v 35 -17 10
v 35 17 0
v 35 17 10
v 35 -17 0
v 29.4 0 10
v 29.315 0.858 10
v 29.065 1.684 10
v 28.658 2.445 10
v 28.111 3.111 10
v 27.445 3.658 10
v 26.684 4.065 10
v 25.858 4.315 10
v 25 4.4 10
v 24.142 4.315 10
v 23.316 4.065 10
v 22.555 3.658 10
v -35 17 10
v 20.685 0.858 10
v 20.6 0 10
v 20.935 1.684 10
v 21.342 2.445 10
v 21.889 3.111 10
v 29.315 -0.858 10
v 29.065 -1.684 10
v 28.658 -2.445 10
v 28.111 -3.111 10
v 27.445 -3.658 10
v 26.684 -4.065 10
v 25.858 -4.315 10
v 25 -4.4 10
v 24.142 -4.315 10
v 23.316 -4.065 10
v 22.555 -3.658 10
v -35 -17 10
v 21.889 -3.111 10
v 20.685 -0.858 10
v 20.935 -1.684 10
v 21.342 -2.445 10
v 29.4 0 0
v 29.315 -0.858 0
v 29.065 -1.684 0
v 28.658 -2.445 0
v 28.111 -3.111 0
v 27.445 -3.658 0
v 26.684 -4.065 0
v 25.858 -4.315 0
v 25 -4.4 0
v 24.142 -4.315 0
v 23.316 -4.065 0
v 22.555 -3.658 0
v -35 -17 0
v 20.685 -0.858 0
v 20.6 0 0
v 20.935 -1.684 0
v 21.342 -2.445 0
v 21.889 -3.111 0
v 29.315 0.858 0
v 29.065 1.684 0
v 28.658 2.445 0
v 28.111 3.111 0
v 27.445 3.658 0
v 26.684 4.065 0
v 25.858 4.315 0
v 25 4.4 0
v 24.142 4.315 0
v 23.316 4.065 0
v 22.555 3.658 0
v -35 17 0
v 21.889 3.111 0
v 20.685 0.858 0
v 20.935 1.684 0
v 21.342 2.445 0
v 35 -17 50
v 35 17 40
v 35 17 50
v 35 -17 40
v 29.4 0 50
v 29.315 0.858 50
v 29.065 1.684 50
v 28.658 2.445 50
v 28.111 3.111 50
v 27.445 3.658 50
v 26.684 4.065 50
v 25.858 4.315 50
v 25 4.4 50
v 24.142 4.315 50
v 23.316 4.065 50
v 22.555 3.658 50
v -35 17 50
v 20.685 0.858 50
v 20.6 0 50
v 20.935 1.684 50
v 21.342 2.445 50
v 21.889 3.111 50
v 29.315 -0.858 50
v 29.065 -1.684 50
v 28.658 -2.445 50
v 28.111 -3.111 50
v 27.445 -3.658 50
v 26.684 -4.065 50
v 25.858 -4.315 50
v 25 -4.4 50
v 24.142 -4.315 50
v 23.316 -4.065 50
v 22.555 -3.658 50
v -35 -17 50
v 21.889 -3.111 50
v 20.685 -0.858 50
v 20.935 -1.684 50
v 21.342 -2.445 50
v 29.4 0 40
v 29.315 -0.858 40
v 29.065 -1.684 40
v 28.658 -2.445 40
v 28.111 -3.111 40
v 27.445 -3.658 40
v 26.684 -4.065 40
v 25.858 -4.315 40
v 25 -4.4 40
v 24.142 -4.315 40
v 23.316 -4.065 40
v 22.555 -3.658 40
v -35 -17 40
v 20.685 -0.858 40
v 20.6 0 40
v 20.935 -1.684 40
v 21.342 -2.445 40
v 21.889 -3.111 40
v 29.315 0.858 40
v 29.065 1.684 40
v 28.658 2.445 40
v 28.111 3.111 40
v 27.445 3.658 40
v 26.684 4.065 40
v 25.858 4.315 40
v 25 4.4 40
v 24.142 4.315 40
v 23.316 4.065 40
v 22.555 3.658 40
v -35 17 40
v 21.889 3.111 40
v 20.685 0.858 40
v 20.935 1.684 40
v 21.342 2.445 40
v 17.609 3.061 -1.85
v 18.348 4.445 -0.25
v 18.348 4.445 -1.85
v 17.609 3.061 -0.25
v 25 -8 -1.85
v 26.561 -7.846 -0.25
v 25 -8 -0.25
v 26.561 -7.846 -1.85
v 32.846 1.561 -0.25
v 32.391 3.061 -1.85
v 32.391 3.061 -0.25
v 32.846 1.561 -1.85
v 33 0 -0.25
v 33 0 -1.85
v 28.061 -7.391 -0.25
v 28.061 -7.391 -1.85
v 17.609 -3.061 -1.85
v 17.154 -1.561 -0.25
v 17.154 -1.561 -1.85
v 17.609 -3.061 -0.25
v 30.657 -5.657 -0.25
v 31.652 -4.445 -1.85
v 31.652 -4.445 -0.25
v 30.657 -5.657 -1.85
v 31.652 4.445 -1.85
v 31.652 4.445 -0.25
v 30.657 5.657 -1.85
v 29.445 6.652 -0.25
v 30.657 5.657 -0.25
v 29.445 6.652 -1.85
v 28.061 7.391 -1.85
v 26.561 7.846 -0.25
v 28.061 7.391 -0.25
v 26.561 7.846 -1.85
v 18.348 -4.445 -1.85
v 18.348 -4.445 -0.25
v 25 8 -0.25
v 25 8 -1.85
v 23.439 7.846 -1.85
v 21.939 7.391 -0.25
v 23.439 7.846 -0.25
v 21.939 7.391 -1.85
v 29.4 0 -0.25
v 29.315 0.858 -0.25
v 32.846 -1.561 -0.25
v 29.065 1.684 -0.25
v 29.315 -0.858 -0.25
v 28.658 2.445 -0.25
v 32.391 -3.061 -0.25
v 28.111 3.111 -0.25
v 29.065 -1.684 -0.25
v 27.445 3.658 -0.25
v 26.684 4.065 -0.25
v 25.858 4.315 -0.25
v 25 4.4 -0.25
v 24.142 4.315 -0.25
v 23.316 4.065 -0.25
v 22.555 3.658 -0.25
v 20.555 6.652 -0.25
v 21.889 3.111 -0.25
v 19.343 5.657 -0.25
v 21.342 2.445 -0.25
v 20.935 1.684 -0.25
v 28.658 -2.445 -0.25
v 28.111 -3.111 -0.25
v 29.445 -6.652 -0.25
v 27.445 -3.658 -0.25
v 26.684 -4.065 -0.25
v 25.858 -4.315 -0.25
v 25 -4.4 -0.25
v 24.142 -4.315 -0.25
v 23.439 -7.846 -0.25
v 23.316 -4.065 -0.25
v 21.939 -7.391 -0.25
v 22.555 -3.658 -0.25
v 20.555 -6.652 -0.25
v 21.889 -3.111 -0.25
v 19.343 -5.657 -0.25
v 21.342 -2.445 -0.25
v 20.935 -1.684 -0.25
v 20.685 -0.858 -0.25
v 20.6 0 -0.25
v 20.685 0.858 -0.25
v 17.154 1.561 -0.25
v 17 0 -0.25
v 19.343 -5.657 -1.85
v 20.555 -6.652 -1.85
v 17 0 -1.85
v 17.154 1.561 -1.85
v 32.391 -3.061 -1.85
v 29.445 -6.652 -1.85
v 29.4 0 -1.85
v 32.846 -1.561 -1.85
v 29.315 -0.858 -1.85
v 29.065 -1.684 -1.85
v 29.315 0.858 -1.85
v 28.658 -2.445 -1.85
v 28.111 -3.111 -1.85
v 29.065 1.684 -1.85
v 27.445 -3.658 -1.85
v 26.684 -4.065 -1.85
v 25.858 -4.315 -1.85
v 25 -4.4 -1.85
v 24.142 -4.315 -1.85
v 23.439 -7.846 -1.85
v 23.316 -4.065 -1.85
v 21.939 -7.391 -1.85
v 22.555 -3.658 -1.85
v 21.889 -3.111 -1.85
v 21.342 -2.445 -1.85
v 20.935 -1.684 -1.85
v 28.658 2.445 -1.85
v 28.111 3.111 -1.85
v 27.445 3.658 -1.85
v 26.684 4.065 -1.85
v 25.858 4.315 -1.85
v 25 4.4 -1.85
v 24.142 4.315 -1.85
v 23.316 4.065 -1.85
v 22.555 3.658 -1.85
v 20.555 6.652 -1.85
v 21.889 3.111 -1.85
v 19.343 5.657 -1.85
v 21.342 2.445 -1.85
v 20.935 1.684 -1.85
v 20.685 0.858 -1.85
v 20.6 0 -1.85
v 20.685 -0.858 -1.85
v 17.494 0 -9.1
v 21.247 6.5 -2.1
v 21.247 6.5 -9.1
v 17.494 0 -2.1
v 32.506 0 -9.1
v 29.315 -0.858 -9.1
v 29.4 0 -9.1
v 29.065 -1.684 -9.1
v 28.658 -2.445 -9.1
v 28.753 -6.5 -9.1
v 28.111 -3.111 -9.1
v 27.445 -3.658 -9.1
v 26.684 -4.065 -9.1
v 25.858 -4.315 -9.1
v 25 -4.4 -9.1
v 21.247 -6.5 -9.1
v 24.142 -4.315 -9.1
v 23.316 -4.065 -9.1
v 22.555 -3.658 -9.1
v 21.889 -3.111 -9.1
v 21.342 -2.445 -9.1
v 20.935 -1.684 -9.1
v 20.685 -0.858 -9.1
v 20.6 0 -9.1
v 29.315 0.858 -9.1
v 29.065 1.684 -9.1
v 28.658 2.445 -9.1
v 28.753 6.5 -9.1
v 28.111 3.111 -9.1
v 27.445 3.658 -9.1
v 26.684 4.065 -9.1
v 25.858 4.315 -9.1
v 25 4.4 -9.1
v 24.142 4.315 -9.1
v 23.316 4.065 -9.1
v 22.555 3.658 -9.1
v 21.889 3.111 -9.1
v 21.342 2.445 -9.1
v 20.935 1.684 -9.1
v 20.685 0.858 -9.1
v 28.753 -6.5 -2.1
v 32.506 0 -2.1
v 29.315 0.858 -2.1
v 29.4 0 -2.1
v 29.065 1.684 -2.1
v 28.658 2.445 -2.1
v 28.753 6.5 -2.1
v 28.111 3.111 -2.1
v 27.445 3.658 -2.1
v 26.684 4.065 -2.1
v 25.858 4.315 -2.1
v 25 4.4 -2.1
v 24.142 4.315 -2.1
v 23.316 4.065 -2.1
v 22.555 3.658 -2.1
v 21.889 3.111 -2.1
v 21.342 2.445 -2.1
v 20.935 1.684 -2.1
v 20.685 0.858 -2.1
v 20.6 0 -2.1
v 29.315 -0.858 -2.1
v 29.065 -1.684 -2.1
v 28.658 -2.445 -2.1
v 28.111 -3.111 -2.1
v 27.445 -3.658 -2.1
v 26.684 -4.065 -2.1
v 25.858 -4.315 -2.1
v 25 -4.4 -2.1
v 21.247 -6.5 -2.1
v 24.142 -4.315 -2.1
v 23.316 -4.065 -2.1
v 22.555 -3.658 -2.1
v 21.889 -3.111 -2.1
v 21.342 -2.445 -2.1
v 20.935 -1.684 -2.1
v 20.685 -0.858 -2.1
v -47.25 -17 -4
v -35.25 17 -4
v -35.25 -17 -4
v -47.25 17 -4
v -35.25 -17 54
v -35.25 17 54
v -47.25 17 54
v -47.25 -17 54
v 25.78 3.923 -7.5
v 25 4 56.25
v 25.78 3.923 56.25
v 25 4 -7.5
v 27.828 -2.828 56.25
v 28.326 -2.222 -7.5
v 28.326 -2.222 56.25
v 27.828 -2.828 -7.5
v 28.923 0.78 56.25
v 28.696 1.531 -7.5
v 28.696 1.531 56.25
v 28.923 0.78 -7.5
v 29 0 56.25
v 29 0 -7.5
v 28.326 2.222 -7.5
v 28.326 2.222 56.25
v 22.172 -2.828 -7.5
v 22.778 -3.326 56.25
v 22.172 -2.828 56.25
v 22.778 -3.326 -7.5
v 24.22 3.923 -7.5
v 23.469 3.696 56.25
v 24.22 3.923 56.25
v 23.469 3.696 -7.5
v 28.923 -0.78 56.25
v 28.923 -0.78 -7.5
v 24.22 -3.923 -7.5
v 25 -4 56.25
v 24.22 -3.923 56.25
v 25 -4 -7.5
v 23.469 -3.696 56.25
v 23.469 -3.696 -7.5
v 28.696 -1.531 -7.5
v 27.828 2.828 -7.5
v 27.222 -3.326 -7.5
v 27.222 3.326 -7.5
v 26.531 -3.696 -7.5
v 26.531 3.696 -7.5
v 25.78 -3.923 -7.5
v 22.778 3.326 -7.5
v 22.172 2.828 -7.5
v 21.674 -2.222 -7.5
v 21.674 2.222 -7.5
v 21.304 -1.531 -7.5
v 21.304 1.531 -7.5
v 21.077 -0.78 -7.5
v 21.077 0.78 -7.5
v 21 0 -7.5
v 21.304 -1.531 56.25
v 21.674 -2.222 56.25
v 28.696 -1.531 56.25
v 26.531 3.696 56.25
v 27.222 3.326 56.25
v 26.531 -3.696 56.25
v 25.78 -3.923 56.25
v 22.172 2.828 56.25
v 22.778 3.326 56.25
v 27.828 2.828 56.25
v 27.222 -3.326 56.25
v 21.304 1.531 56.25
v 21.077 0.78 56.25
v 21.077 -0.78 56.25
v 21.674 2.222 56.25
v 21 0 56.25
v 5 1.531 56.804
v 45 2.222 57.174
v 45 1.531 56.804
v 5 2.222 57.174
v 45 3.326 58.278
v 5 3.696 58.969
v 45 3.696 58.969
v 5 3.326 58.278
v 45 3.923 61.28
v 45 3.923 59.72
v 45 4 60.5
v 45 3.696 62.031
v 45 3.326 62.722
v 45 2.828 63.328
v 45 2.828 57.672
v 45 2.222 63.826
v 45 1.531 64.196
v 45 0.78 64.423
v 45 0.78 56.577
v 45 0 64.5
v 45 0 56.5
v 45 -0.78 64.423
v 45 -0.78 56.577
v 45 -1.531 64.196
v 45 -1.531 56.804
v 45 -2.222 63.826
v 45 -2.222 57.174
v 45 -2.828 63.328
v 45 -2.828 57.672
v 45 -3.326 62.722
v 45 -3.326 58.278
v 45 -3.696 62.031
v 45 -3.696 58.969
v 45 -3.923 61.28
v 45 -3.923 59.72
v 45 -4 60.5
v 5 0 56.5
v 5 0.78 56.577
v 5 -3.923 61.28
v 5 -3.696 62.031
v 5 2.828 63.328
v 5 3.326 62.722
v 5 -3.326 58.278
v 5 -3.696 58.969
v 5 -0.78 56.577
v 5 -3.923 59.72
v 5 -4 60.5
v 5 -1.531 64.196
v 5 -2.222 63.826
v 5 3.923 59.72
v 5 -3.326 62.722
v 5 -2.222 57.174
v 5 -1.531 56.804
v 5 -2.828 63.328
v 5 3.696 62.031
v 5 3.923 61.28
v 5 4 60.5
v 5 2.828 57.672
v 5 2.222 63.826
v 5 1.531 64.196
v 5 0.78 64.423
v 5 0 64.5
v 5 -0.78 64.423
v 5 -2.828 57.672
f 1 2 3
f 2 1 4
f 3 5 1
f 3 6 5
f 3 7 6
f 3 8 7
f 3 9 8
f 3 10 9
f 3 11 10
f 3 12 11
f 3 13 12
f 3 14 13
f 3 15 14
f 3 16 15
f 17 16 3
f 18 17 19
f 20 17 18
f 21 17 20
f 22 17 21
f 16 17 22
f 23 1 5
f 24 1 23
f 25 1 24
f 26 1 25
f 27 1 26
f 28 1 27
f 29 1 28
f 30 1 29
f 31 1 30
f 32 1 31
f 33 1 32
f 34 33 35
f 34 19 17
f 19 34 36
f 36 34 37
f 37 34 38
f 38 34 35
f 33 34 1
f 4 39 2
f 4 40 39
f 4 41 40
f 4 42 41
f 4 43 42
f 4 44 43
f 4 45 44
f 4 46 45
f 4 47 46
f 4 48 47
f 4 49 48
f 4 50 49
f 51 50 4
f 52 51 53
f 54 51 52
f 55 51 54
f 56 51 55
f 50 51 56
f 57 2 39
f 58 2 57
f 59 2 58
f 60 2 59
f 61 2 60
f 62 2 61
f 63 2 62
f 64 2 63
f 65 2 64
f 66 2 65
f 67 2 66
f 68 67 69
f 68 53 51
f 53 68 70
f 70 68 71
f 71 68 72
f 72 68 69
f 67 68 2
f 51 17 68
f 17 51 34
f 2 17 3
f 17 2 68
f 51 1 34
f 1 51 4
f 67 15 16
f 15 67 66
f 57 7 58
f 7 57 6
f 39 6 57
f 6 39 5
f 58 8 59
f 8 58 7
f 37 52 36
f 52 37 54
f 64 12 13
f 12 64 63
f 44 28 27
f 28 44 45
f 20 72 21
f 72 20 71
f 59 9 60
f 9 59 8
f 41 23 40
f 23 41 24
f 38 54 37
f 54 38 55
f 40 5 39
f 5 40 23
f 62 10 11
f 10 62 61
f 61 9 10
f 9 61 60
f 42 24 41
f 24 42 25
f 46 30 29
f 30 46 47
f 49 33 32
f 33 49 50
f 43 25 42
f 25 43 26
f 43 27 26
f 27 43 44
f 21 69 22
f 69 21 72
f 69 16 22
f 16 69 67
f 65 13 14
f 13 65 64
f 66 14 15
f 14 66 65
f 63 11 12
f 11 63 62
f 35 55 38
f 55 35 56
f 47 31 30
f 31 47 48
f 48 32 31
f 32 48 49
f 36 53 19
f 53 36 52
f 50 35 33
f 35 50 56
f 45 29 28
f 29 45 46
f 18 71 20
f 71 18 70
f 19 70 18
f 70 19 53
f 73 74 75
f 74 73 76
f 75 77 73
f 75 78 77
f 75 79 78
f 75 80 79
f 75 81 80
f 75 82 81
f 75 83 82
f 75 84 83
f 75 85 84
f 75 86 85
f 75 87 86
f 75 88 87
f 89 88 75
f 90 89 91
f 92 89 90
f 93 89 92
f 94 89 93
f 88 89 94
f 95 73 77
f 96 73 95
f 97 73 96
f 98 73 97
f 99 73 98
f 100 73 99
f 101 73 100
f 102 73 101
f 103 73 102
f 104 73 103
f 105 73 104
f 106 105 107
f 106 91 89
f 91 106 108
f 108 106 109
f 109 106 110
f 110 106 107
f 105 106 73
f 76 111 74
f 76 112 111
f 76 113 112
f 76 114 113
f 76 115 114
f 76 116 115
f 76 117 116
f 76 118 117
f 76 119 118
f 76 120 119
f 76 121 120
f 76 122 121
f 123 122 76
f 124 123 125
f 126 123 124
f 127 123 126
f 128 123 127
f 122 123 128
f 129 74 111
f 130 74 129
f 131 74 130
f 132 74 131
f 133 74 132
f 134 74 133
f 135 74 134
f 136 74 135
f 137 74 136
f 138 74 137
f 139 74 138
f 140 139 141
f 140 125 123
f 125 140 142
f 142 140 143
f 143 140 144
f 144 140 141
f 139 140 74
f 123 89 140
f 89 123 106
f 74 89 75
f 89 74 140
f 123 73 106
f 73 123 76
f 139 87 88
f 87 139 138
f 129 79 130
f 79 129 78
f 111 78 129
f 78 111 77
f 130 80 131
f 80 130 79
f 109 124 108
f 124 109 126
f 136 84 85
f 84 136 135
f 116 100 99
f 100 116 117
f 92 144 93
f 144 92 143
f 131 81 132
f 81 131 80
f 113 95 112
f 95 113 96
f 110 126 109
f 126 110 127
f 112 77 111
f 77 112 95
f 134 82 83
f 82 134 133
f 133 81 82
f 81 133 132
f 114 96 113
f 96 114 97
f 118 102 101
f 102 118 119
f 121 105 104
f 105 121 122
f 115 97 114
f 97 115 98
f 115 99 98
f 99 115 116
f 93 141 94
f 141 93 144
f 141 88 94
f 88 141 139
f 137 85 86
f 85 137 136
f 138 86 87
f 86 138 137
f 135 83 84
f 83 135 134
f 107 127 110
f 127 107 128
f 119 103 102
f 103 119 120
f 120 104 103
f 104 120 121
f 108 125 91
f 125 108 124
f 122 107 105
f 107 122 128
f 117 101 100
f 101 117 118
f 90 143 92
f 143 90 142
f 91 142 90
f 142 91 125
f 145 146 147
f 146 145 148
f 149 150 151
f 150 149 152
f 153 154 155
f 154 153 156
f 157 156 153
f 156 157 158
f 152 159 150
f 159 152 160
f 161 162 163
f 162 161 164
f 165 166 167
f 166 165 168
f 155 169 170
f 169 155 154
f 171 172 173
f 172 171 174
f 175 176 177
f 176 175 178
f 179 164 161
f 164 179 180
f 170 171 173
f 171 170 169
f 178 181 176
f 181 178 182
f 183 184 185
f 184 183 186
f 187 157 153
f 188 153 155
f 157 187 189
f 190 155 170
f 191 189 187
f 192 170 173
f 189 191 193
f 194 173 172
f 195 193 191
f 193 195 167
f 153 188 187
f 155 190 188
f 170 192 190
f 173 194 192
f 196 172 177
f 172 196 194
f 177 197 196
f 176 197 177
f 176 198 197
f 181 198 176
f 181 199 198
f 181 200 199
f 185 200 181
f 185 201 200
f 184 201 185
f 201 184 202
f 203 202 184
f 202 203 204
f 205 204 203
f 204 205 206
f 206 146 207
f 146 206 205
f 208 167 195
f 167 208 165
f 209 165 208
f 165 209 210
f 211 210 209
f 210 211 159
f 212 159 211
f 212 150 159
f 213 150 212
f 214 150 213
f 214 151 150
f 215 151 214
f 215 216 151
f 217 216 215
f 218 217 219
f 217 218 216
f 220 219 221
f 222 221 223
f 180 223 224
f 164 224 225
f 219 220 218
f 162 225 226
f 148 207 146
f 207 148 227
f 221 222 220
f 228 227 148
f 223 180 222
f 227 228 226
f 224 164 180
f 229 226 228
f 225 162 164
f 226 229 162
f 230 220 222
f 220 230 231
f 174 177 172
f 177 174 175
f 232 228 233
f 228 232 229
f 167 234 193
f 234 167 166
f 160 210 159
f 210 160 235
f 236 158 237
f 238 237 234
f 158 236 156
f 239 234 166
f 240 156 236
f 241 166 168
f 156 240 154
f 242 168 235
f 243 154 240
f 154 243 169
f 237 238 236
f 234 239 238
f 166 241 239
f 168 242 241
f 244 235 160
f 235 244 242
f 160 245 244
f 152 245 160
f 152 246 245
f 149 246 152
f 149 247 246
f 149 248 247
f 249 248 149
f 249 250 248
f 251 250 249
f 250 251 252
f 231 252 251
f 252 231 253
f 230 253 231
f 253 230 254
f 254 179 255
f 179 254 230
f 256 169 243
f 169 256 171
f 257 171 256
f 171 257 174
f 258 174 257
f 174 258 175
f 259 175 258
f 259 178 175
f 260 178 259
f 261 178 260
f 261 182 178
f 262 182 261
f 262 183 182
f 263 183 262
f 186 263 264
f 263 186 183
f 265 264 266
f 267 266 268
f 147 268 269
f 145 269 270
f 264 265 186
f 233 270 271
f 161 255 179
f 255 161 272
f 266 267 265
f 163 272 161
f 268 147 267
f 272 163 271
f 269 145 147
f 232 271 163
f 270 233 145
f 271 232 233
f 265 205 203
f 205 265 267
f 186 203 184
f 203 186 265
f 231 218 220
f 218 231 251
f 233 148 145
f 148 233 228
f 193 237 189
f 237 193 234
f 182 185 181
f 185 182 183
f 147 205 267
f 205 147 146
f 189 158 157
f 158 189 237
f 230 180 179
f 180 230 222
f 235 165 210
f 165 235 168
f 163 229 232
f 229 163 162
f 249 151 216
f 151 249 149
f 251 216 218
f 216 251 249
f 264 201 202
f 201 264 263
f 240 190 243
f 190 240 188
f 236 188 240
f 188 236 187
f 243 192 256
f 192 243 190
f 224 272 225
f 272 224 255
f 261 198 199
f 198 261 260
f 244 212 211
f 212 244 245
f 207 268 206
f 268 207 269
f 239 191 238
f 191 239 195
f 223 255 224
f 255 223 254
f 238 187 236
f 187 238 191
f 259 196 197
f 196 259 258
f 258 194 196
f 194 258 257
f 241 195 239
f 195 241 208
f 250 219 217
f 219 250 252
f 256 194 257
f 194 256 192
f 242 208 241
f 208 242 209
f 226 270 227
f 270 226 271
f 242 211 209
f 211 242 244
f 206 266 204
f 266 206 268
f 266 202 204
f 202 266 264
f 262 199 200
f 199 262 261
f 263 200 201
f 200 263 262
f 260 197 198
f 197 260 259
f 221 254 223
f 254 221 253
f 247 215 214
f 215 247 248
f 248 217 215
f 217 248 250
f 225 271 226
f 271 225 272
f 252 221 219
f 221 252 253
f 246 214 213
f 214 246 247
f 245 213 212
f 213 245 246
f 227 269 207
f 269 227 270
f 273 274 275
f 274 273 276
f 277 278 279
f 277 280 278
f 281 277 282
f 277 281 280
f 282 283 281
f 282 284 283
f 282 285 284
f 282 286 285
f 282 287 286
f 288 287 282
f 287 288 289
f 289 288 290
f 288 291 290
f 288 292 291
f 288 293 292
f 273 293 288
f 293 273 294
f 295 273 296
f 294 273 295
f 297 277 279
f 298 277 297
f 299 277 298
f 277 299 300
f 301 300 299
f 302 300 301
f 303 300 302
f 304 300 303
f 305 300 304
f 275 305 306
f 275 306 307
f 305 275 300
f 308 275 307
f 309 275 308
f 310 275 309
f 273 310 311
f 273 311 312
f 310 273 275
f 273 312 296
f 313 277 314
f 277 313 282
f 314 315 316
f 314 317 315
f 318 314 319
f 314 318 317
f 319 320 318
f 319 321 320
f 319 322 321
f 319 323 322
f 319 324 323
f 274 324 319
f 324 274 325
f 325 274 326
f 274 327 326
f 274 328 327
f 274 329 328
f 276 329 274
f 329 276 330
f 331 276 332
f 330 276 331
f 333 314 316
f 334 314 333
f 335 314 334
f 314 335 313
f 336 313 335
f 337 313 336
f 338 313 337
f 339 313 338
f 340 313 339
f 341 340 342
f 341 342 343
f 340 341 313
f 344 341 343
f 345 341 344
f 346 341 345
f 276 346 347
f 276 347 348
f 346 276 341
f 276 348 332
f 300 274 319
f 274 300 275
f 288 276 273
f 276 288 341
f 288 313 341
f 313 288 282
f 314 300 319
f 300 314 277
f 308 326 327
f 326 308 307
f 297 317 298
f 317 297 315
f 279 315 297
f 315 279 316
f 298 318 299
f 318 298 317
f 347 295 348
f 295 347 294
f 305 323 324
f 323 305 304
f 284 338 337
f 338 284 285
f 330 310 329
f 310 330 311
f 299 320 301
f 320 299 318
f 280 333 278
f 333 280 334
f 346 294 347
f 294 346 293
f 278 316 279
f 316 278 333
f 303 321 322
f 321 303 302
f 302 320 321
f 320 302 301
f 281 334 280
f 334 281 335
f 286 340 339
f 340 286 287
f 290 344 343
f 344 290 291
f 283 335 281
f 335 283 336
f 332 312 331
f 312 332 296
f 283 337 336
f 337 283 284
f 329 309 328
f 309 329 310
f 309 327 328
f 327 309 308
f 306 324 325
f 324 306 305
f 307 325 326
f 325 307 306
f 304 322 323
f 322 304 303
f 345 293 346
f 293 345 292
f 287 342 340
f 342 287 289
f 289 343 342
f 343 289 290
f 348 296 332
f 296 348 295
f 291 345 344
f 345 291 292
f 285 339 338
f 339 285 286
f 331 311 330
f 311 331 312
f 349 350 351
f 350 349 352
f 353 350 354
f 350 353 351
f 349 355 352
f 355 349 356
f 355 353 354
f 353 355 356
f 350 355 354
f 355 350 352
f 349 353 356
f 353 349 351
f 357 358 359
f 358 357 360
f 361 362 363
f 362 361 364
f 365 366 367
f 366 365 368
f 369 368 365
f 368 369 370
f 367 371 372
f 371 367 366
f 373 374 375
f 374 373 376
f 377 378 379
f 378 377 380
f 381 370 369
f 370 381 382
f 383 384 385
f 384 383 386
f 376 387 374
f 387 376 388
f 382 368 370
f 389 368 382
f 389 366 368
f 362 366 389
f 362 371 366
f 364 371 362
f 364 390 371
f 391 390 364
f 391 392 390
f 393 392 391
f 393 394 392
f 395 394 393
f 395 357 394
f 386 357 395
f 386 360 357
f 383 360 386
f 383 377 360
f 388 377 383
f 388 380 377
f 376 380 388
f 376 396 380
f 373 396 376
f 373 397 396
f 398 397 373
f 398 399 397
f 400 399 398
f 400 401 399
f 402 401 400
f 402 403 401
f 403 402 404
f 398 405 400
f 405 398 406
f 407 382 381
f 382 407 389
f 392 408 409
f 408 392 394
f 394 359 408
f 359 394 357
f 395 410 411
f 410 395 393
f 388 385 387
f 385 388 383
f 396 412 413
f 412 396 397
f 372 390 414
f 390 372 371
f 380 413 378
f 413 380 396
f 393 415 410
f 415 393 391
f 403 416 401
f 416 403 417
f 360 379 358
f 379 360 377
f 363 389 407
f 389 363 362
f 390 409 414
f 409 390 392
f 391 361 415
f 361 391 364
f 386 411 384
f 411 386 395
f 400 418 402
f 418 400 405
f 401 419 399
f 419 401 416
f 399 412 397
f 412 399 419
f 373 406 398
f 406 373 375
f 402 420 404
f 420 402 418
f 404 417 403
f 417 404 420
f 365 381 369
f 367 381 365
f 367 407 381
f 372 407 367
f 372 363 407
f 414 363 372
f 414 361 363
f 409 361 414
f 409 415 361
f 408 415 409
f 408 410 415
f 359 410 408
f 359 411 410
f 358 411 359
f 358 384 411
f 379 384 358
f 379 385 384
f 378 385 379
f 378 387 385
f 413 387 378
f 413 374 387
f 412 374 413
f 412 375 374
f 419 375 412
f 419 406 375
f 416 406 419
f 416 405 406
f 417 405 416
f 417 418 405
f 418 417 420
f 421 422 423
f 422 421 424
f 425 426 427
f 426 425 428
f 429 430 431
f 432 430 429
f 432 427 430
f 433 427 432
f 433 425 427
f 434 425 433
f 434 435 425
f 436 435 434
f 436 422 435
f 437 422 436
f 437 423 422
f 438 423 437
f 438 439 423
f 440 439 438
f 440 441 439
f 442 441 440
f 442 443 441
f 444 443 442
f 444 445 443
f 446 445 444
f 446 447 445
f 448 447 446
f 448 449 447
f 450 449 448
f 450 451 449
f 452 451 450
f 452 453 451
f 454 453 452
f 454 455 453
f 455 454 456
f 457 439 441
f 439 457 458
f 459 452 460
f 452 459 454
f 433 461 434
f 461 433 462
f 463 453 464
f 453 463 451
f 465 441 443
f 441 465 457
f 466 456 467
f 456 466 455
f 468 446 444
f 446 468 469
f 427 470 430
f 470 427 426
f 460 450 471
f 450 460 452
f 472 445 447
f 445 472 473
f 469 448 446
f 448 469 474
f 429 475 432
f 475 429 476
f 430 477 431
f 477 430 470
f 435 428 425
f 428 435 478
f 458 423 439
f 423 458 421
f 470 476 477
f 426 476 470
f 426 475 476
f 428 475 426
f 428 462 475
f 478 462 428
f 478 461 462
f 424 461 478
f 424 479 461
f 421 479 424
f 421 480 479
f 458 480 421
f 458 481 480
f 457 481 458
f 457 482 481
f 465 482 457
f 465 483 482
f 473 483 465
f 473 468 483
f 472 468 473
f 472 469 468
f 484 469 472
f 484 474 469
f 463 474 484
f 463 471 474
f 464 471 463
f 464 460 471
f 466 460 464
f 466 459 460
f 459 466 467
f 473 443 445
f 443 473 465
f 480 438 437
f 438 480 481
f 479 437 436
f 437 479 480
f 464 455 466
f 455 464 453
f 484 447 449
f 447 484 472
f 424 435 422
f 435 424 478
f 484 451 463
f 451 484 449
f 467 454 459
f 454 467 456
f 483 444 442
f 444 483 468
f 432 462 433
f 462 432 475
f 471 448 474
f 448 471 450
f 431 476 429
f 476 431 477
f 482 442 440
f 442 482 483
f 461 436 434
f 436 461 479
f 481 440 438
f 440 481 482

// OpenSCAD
$fn = 32;

// ------------------------------------------------------------------------
// C clamp: throat 40 mm, screw d8
// Every part is its own module, assembly() places every instance.
// ------------------------------------------------------------------------

// --- part 1 ---
module clamp_arm() {
  difference() {
    translate([-35, -17, 0]) cube([70, 34, 10]);
    translate([25, 0, -1]) cylinder(h = 12, d = 8.8);
  }
}

// --- part 2 ---
module clamp_spine() {
  difference() {
    translate([-29, -17, 0]) cube([58, 34, 12]);
  }
}

// --- part 3 ---
module clamp_screw() {
  translate([0, 0, -31.875]) cylinder(h = 63.75, d = 8);
}

// --- part 4 ---
module clamp_washer() {
  difference() {
      translate([0, 0, 0]) cylinder(h = 1.6, d = 16);
      translate([0, 0, -1]) cylinder(h = 3.6, d = 8.8);
    }
}

// --- part 5 ---
module clamp_nut() {
  difference() {
    linear_extrude(height = 7) polygon(points = [[7.506, 0], [3.753, 6.5], [-3.753, 6.5], [-7.506, 0], [-3.753, -6.5], [3.753, -6.5]]);
    translate([0, 0, -1]) cylinder(h = 9, d = 8.8);
  }
}

// --- part 6 ---
module tommy_bar() {
  translate([0, 0, -20]) cylinder(h = 40, d = 8);
}

// --- assembly ---
module assembly() {
  color([0.80, 0.24, 0.20]) translate([0, 0, 0]) rotate([0, 0, 0]) clamp_arm();
  color([0.20, 0.45, 0.75]) translate([0, 0, 40]) rotate([0, 0, 0]) clamp_arm();
  color([0.25, 0.62, 0.32]) translate([-47.25, 0, 25]) rotate([0, 90, 0]) clamp_spine();
  color([0.92, 0.70, 0.18]) translate([25, 0, 24.375]) rotate([0, 0, 0]) clamp_screw();
  color([0.58, 0.35, 0.70]) translate([25, 0, -1.85]) rotate([0, 0, 0]) clamp_washer();
  color([0.16, 0.66, 0.66]) translate([25, 0, -9.1]) rotate([0, 0, 0]) clamp_nut();
  color([0.85, 0.48, 0.18]) translate([25, 0, 60.5]) rotate([0, 90, 0]) tommy_bar();
}

assembly();
